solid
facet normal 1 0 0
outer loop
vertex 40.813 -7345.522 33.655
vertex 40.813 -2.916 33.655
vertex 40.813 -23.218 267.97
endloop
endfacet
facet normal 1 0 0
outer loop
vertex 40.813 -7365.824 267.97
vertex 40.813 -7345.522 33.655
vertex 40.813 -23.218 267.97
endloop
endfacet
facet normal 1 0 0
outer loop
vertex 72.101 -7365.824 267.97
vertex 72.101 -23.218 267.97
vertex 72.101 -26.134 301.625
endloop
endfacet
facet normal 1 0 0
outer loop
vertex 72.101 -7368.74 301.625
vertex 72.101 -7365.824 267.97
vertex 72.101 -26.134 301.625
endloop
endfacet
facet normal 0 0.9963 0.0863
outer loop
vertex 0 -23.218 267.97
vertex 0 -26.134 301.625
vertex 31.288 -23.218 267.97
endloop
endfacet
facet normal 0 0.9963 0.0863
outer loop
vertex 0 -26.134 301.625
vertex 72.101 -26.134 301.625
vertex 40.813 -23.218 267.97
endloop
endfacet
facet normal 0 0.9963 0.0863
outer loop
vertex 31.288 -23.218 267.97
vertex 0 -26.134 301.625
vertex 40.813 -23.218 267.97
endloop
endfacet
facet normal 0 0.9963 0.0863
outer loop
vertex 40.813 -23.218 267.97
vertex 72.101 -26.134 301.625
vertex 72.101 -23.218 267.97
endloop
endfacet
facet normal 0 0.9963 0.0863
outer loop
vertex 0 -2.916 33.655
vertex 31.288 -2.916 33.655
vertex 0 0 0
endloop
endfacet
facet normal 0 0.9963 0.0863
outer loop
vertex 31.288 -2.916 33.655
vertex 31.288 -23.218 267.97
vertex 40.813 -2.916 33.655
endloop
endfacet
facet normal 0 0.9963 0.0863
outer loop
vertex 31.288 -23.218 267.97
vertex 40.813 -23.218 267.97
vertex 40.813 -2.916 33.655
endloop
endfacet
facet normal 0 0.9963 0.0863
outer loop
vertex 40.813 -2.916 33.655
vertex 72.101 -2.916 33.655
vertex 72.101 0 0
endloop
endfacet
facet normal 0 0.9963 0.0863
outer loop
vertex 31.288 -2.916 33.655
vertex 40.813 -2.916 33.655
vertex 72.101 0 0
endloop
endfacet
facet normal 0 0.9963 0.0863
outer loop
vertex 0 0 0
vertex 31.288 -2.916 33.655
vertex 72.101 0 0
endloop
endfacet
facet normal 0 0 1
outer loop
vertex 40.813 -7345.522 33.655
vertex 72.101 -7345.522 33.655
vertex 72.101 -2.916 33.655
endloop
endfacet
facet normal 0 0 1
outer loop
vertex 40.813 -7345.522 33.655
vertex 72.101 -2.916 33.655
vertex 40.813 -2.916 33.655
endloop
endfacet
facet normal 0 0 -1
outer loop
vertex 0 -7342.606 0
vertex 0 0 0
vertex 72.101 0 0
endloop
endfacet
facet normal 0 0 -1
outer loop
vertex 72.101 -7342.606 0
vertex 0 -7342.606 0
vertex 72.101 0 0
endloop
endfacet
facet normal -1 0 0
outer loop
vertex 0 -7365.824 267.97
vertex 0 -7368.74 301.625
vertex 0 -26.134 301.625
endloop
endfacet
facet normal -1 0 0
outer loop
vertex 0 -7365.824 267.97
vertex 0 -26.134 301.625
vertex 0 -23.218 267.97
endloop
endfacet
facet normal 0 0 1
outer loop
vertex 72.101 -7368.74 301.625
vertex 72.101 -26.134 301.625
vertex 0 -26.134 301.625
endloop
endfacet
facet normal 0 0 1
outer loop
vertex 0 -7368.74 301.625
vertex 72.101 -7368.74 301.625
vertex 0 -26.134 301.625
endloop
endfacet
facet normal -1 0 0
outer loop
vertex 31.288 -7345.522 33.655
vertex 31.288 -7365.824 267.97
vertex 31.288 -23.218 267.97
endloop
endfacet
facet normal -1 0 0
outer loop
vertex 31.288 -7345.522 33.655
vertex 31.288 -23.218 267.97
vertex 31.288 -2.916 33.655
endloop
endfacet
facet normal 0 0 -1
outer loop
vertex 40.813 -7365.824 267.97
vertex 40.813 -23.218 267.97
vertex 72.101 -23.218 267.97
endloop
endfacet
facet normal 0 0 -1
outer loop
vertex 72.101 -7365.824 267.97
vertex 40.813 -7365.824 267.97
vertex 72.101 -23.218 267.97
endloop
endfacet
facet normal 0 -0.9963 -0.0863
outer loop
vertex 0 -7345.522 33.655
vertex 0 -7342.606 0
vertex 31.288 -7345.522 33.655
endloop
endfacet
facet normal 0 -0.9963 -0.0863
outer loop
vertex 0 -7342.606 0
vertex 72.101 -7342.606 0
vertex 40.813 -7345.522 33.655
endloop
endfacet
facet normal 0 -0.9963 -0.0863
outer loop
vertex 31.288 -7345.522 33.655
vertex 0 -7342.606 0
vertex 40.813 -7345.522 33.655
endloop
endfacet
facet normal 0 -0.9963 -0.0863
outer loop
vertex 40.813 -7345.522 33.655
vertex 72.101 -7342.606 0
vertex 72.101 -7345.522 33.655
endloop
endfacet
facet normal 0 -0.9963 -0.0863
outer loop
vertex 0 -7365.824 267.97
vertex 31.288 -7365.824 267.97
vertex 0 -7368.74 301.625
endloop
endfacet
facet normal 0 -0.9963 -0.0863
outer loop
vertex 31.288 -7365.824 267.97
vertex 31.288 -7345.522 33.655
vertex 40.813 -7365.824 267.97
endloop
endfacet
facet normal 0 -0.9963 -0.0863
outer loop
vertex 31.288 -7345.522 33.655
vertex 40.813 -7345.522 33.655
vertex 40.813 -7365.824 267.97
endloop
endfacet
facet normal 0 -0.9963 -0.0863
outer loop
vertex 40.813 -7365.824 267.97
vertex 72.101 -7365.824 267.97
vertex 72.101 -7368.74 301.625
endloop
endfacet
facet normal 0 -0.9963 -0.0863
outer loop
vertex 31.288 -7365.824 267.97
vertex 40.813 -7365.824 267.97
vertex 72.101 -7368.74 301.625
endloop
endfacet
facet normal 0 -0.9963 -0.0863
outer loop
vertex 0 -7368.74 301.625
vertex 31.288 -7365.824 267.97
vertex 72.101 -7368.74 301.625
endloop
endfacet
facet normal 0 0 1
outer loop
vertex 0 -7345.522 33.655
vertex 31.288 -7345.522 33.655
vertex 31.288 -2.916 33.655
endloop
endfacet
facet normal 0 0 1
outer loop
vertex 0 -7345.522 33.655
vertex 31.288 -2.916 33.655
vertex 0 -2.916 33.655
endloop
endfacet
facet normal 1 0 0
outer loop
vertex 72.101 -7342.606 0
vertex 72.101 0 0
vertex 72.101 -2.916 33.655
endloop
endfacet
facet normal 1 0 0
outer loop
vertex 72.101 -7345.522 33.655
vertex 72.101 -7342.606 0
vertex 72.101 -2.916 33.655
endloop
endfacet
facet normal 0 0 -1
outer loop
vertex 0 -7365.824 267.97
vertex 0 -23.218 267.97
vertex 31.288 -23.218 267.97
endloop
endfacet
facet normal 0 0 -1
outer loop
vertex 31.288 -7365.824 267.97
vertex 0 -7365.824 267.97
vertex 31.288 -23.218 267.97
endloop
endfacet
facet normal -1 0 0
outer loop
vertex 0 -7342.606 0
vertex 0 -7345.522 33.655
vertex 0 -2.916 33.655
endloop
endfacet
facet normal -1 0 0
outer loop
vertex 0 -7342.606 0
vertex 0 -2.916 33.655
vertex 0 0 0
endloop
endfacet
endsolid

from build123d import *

# Parameters (mm, degrees)
F1_DEPTH = 7620
F3_DEPTH = 72.10199


with BuildPart() as f1:
    # F0 (on Front) → F1 (new body)
    with BuildSketch(Plane.XZ):
        Polygon((0, 33.655), (0, 0), (72.10099, 0), (72.10099, 33.655), (40.812995, 33.655), (40.812995, 267.97), (72.10099, 267.97), (72.10099, 301.625), (0, 301.625), (0, 267.97), (31.287995, 267.97), (31.287995, 33.655), align=None)
    extrude(amount=F1_DEPTH)

    # F2 (on face) → F3 (cut, through all)
    with BuildSketch(Plane.YZ.offset(72.10099)):
        Polygon((-7620, 0), (-7342.606046, 0), (-7368.73962, 301.625), (-7620, 301.625), align=None)
        Polygon((-26.133574, 301.625), (0, 0), (0, 301.625), align=None)
    extrude(amount=-F3_DEPTH, mode=Mode.SUBTRACT)


solid = f1.part
